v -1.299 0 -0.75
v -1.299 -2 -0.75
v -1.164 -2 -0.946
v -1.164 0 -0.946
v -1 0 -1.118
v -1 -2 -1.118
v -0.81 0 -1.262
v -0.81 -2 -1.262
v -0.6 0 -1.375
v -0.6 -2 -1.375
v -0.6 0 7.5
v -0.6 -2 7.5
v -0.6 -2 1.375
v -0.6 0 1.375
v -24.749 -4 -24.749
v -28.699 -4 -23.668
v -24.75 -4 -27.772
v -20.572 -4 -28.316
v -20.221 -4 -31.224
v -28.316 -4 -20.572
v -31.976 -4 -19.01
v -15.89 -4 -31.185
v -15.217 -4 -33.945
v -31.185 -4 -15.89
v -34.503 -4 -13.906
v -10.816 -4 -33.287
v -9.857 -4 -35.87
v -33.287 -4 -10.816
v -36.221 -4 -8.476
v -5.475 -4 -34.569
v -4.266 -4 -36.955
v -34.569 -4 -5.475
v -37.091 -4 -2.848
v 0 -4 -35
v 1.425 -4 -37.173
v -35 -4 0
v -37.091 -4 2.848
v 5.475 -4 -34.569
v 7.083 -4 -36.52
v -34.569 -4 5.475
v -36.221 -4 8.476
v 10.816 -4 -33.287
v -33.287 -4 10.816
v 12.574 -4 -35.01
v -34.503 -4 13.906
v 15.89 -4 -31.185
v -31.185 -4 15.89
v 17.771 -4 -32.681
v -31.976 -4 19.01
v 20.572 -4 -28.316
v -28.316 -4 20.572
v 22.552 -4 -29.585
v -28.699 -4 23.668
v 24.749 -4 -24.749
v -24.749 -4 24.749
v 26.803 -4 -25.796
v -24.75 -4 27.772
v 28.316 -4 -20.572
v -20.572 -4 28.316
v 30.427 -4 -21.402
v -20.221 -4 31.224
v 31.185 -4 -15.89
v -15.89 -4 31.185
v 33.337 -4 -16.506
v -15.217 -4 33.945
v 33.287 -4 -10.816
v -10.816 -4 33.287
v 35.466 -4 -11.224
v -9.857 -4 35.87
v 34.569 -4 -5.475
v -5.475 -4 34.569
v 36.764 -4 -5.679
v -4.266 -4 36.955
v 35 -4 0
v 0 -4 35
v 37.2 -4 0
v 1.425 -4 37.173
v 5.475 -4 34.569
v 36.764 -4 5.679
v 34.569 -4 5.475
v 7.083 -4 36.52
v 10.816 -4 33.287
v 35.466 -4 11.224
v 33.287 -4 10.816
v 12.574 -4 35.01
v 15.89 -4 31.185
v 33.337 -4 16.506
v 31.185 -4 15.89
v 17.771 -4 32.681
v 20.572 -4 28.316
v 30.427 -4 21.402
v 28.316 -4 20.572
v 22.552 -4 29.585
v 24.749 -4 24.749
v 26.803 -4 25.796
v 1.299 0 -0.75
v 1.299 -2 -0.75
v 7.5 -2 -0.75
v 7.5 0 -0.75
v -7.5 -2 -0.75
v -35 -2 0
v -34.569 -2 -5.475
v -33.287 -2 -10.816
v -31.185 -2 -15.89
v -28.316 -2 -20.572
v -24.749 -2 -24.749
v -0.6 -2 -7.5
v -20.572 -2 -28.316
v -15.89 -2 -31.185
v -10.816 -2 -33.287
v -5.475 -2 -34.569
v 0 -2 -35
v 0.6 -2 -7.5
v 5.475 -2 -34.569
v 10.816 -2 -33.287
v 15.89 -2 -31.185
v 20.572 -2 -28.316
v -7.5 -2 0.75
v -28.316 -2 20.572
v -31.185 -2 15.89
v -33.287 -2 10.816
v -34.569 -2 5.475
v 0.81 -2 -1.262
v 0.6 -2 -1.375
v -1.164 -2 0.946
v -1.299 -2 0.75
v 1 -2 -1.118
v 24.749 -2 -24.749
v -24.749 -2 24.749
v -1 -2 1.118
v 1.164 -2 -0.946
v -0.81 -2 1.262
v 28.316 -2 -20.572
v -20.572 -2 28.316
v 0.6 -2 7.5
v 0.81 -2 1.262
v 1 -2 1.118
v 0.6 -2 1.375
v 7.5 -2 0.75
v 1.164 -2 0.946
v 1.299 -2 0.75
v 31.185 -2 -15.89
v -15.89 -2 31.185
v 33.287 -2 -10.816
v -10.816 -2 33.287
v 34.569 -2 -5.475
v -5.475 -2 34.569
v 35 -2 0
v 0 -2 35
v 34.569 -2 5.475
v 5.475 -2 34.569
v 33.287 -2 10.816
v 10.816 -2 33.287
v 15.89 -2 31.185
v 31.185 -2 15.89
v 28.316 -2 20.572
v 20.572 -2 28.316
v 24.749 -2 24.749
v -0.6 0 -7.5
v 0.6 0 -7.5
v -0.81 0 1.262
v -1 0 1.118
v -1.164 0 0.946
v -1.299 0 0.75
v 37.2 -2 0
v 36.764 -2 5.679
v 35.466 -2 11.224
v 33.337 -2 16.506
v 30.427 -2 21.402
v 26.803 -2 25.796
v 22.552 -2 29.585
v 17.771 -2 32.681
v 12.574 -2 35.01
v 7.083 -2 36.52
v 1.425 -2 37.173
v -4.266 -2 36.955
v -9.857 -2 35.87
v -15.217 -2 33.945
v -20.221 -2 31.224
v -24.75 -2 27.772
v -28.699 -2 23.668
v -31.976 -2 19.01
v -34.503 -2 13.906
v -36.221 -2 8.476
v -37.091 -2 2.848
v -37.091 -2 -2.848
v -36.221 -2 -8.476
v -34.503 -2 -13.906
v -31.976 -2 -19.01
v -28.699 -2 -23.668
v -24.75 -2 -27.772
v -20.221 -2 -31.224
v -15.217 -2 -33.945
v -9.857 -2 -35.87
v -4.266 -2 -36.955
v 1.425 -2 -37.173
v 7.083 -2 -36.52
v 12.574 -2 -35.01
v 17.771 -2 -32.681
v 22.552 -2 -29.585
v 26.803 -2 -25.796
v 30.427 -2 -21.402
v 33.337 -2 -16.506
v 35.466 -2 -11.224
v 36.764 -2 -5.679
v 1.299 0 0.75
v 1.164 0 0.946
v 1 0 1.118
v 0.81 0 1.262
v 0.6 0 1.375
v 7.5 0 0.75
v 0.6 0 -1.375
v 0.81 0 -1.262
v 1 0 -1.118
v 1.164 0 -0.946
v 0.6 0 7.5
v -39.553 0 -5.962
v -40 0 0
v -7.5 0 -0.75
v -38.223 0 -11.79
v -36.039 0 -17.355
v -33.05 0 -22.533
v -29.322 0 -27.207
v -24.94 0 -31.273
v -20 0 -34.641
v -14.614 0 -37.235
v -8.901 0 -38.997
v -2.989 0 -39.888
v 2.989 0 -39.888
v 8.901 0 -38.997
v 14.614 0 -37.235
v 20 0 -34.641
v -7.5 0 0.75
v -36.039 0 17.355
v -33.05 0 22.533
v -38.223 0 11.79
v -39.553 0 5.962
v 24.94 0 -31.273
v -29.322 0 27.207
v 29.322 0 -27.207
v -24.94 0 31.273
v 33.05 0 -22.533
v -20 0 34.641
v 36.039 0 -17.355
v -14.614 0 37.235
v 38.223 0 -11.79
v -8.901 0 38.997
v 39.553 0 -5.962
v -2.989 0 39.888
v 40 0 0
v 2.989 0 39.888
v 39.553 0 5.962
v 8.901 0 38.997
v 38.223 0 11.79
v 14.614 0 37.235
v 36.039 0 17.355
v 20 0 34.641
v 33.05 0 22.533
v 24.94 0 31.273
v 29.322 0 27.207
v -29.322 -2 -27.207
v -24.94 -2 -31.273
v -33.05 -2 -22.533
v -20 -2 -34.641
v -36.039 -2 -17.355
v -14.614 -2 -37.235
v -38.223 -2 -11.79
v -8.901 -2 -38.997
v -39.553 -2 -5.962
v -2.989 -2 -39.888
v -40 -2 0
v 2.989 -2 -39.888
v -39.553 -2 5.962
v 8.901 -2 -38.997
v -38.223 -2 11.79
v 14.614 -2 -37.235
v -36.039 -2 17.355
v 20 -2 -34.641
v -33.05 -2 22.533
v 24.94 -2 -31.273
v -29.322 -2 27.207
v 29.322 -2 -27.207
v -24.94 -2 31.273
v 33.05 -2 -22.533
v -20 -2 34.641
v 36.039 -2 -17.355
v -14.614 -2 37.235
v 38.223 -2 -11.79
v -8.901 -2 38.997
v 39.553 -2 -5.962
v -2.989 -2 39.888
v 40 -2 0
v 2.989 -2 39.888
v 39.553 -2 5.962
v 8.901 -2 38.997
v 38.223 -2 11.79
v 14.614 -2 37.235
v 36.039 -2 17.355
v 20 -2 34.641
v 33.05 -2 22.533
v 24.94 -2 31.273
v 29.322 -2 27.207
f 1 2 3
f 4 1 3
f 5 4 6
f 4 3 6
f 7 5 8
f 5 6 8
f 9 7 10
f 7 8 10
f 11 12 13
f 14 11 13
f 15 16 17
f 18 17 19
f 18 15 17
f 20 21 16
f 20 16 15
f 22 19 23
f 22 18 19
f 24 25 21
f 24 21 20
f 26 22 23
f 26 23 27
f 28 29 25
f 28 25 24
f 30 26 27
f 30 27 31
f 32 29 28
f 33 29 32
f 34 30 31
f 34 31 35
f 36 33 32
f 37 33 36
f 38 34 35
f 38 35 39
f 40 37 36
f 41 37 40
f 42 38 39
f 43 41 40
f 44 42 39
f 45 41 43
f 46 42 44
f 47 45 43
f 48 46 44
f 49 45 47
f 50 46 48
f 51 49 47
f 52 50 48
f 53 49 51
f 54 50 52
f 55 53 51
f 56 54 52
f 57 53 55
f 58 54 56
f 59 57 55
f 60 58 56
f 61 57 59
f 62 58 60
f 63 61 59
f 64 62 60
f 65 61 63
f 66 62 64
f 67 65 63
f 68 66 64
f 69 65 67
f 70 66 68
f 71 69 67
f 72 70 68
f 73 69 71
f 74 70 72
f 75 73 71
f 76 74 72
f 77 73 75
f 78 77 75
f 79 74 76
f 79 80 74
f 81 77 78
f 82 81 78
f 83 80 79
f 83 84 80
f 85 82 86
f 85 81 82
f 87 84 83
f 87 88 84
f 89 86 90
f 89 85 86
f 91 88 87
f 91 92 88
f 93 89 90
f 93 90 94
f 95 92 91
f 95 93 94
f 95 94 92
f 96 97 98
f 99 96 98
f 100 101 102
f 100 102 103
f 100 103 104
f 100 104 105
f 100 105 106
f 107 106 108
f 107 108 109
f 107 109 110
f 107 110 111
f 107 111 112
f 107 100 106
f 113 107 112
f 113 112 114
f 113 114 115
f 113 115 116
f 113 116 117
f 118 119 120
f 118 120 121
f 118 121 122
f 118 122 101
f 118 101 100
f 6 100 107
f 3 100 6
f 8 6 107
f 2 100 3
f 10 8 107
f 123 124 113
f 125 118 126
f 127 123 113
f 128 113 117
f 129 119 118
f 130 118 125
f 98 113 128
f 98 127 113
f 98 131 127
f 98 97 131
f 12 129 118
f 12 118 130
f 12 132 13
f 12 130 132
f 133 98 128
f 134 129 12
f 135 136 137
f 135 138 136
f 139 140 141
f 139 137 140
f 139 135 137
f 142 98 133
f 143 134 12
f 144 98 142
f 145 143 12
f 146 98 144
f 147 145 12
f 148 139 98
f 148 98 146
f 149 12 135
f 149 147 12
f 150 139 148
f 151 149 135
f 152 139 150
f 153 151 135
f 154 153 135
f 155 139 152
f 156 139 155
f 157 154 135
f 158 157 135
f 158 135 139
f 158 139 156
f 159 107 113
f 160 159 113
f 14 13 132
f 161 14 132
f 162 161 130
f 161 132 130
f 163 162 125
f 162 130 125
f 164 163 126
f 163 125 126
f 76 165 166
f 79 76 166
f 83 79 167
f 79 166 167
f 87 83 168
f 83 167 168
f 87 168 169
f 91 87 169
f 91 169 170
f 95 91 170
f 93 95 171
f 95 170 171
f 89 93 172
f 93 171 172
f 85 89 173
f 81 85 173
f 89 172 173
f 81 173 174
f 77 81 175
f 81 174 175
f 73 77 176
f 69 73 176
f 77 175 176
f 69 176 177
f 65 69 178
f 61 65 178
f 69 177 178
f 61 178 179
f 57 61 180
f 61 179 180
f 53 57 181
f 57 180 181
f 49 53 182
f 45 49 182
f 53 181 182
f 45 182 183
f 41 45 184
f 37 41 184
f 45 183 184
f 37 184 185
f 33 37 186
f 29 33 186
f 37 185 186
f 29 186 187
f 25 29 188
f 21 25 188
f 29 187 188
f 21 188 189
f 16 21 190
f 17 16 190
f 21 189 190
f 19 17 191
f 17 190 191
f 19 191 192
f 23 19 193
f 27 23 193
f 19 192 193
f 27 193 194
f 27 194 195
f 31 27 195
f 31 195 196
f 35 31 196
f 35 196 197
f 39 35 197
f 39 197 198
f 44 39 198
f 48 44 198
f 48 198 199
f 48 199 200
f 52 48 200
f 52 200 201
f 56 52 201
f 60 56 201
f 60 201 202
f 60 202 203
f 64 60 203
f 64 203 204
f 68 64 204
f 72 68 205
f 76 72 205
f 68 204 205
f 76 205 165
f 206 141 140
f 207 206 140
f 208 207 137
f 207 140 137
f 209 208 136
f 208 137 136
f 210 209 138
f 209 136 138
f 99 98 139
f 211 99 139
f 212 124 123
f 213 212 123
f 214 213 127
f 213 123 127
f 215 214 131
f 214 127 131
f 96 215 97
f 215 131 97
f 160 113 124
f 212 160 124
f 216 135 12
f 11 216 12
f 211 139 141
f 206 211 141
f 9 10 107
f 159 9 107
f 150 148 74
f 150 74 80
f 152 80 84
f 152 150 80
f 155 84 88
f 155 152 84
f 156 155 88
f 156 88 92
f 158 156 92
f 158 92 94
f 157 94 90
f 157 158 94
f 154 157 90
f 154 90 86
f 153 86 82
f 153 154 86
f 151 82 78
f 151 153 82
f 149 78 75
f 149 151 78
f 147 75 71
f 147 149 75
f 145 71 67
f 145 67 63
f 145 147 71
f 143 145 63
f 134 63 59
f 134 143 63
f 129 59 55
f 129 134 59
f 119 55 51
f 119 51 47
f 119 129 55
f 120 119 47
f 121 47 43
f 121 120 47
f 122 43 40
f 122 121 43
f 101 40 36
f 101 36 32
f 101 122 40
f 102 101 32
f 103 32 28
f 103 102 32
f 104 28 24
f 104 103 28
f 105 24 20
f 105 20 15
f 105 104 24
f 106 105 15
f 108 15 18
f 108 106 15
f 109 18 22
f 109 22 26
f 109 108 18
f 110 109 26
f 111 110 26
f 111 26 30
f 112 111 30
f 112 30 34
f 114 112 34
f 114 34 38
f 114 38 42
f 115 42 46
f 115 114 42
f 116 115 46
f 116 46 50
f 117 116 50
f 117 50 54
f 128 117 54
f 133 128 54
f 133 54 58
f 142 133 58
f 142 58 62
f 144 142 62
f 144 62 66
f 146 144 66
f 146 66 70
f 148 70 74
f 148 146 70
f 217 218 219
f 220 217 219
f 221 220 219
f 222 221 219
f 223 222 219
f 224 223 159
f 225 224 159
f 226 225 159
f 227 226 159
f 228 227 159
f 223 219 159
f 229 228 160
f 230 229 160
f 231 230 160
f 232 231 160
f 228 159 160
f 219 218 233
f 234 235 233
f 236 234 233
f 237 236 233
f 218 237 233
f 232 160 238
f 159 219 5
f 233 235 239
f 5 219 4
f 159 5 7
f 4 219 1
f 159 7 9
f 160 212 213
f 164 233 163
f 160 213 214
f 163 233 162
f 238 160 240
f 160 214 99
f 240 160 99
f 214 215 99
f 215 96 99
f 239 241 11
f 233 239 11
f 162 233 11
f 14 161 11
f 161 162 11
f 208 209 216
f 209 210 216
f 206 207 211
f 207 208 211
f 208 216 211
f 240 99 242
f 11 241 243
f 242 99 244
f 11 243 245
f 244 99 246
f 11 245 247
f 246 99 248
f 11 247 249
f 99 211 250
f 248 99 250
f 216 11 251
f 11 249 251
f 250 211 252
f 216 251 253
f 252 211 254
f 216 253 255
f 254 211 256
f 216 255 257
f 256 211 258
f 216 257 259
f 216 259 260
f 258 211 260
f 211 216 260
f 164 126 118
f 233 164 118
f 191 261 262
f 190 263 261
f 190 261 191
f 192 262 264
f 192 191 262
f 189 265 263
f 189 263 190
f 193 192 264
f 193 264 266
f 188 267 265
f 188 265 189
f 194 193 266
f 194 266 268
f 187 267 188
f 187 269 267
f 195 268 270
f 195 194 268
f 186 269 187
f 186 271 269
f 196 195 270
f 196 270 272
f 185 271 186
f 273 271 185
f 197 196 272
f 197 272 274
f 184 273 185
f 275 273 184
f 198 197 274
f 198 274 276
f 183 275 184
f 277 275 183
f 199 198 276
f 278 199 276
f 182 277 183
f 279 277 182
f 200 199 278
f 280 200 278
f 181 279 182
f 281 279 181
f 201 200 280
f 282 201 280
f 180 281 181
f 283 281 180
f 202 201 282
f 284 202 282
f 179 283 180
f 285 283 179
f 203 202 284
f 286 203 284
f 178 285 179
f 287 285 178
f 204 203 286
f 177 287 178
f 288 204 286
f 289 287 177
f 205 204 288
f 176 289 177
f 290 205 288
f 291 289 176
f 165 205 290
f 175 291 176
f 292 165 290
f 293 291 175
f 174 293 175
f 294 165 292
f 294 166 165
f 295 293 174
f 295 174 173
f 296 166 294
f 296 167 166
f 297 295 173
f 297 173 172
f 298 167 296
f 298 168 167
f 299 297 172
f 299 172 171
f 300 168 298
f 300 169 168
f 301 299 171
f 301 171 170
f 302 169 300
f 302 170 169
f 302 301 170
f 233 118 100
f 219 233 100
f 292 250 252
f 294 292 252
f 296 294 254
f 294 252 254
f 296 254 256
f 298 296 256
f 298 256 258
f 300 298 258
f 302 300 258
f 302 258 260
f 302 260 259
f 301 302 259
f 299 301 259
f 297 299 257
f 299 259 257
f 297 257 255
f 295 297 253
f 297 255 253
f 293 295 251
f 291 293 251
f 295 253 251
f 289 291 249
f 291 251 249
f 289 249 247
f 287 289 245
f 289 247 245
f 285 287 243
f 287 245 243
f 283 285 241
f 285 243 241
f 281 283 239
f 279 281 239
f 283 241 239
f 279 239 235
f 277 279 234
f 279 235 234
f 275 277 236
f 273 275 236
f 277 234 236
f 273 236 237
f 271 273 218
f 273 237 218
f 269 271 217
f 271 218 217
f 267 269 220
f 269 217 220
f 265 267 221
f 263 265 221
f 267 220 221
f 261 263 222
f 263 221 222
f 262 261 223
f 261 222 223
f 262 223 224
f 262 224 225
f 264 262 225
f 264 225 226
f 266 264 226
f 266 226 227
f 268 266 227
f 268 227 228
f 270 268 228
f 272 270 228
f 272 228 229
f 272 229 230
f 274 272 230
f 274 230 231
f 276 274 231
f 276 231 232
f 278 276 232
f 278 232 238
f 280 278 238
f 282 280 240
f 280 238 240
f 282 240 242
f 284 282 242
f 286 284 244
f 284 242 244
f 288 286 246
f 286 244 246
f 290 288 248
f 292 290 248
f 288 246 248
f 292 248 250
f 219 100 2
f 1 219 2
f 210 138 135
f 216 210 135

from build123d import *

# Parameters (mm, degrees)
F0_R     = 40
F1_DEPTH = 2
F2_R     = 37.2
F2_R_2   = 35
F3_DEPTH = 2
F5_DEPTH = 25
F6_DEPTH = 25


with BuildPart() as f1:
    # F0 (on Front) → F1 (new body)
    with BuildSketch(Plane.XZ):
        Circle(F0_R)
    extrude(amount=F1_DEPTH)

    # F2 (on face) → F3 (join)
    with BuildSketch(Plane.XZ.offset(2)):
        Circle(F2_R)
        Circle(F2_R_2, mode=Mode.SUBTRACT)
    extrude(amount=F3_DEPTH)

    # F4 (on face) → F5 (cut)
    with BuildSketch(Plane.XZ.offset(2)):
        with BuildLine():
            Line((0.6, 7.5), (-0.6, 7.5))
            Line((-0.6, 7.5), (-0.6, 1.374773))
            ThreePointArc((-0.6, 1.374773), (0, 1.5), (0.6, 1.374773))
            Line((0.6, 1.374773), (0.6, 7.5))
        make_face()
        with BuildLine():
            Line((-0.6, 0.75), (-0.6, 1.374773))
            ThreePointArc((-0.6, 1.374773), (-0.999586, 1.118404), (-1.299038, 0.75))
            Line((-1.299038, 0.75), (-0.6, 0.75))
        make_face()
        with BuildLine():
            ThreePointArc((1.299038, 0.75), (0.999586, 1.118404), (0.6, 1.374773))
            Line((0.6, 1.374773), (0.6, 0.75))
            Line((0.6, 0.75), (1.299038, 0.75))
        make_face()
        with BuildLine():
            ThreePointArc((-1.299038, -0.75), (-1.5, 0), (-1.299038, 0.75))
            Line((-1.299038, 0.75), (-7.5, 0.75))
            Line((-7.5, 0.75), (-7.5, -0.75))
            Line((-7.5, -0.75), (-1.299038, -0.75))
        make_face()
        with BuildLine():
            Line((7.5, 0.75), (1.299038, 0.75))
            ThreePointArc((1.299038, 0.75), (1.448889, 0.388229), (1.5, 0))
            ThreePointArc((1.5, 0), (1.448889, -0.388229), (1.299038, -0.75))
            Line((1.299038, -0.75), (7.5, -0.75))
            Line((7.5, -0.75), (7.5, 0.75))
        make_face()
        with BuildLine():
            Line((-0.6, -1.374773), (-0.6, -0.75))
            Line((-0.6, -0.75), (-1.299038, -0.75))
            ThreePointArc((-1.299038, -0.75), (-0.999586, -1.118404), (-0.6, -1.374773))
        make_face()
        with BuildLine():
            Line((1.299038, -0.75), (0.6, -0.75))
            Line((0.6, -0.75), (0.6, -1.374773))
            ThreePointArc((0.6, -1.374773), (0.999586, -1.118404), (1.299038, -0.75))
        make_face()
        with BuildLine():
            ThreePointArc((0.6, -1.374773), (0, -1.5), (-0.6, -1.374773))
            Line((-0.6, -1.374773), (-0.6, -7.5))
            Line((-0.6, -7.5), (0.6, -7.5))
            Line((0.6, -7.5), (0.6, -1.374773))
        make_face()
    extrude(amount=-F5_DEPTH, mode=Mode.SUBTRACT)

    # F5_face (on face) → F6 (cut)
    with BuildSketch(Plane.XZ.offset(2)):
        with BuildLine():
            ThreePointArc((-0.6, -1.374773), (0, -1.5), (0.6, -1.374773))
            Line((0.6, -1.374773), (0.6, -0.75))
            Line((0.6, -0.75), (1.299038, -0.75))
            ThreePointArc((1.299038, -0.75), (1.5, 0), (1.299038, 0.75))
            Line((1.299038, 0.75), (0.6, 0.75))
            Line((0.6, 0.75), (0.6, 1.374773))
            ThreePointArc((0.6, 1.374773), (0, 1.5), (-0.6, 1.374773))
            Line((-0.6, 1.374773), (-0.6, 0.75))
            Line((-0.6, 0.75), (-1.299038, 0.75))
            ThreePointArc((-1.299038, 0.75), (-1.5, 0), (-1.299038, -0.75))
            Line((-1.299038, -0.75), (-0.6, -0.75))
            Line((-0.6, -0.75), (-0.6, -1.374773))
        make_face()
    extrude(amount=-F6_DEPTH, mode=Mode.SUBTRACT)


solid = f1.part
